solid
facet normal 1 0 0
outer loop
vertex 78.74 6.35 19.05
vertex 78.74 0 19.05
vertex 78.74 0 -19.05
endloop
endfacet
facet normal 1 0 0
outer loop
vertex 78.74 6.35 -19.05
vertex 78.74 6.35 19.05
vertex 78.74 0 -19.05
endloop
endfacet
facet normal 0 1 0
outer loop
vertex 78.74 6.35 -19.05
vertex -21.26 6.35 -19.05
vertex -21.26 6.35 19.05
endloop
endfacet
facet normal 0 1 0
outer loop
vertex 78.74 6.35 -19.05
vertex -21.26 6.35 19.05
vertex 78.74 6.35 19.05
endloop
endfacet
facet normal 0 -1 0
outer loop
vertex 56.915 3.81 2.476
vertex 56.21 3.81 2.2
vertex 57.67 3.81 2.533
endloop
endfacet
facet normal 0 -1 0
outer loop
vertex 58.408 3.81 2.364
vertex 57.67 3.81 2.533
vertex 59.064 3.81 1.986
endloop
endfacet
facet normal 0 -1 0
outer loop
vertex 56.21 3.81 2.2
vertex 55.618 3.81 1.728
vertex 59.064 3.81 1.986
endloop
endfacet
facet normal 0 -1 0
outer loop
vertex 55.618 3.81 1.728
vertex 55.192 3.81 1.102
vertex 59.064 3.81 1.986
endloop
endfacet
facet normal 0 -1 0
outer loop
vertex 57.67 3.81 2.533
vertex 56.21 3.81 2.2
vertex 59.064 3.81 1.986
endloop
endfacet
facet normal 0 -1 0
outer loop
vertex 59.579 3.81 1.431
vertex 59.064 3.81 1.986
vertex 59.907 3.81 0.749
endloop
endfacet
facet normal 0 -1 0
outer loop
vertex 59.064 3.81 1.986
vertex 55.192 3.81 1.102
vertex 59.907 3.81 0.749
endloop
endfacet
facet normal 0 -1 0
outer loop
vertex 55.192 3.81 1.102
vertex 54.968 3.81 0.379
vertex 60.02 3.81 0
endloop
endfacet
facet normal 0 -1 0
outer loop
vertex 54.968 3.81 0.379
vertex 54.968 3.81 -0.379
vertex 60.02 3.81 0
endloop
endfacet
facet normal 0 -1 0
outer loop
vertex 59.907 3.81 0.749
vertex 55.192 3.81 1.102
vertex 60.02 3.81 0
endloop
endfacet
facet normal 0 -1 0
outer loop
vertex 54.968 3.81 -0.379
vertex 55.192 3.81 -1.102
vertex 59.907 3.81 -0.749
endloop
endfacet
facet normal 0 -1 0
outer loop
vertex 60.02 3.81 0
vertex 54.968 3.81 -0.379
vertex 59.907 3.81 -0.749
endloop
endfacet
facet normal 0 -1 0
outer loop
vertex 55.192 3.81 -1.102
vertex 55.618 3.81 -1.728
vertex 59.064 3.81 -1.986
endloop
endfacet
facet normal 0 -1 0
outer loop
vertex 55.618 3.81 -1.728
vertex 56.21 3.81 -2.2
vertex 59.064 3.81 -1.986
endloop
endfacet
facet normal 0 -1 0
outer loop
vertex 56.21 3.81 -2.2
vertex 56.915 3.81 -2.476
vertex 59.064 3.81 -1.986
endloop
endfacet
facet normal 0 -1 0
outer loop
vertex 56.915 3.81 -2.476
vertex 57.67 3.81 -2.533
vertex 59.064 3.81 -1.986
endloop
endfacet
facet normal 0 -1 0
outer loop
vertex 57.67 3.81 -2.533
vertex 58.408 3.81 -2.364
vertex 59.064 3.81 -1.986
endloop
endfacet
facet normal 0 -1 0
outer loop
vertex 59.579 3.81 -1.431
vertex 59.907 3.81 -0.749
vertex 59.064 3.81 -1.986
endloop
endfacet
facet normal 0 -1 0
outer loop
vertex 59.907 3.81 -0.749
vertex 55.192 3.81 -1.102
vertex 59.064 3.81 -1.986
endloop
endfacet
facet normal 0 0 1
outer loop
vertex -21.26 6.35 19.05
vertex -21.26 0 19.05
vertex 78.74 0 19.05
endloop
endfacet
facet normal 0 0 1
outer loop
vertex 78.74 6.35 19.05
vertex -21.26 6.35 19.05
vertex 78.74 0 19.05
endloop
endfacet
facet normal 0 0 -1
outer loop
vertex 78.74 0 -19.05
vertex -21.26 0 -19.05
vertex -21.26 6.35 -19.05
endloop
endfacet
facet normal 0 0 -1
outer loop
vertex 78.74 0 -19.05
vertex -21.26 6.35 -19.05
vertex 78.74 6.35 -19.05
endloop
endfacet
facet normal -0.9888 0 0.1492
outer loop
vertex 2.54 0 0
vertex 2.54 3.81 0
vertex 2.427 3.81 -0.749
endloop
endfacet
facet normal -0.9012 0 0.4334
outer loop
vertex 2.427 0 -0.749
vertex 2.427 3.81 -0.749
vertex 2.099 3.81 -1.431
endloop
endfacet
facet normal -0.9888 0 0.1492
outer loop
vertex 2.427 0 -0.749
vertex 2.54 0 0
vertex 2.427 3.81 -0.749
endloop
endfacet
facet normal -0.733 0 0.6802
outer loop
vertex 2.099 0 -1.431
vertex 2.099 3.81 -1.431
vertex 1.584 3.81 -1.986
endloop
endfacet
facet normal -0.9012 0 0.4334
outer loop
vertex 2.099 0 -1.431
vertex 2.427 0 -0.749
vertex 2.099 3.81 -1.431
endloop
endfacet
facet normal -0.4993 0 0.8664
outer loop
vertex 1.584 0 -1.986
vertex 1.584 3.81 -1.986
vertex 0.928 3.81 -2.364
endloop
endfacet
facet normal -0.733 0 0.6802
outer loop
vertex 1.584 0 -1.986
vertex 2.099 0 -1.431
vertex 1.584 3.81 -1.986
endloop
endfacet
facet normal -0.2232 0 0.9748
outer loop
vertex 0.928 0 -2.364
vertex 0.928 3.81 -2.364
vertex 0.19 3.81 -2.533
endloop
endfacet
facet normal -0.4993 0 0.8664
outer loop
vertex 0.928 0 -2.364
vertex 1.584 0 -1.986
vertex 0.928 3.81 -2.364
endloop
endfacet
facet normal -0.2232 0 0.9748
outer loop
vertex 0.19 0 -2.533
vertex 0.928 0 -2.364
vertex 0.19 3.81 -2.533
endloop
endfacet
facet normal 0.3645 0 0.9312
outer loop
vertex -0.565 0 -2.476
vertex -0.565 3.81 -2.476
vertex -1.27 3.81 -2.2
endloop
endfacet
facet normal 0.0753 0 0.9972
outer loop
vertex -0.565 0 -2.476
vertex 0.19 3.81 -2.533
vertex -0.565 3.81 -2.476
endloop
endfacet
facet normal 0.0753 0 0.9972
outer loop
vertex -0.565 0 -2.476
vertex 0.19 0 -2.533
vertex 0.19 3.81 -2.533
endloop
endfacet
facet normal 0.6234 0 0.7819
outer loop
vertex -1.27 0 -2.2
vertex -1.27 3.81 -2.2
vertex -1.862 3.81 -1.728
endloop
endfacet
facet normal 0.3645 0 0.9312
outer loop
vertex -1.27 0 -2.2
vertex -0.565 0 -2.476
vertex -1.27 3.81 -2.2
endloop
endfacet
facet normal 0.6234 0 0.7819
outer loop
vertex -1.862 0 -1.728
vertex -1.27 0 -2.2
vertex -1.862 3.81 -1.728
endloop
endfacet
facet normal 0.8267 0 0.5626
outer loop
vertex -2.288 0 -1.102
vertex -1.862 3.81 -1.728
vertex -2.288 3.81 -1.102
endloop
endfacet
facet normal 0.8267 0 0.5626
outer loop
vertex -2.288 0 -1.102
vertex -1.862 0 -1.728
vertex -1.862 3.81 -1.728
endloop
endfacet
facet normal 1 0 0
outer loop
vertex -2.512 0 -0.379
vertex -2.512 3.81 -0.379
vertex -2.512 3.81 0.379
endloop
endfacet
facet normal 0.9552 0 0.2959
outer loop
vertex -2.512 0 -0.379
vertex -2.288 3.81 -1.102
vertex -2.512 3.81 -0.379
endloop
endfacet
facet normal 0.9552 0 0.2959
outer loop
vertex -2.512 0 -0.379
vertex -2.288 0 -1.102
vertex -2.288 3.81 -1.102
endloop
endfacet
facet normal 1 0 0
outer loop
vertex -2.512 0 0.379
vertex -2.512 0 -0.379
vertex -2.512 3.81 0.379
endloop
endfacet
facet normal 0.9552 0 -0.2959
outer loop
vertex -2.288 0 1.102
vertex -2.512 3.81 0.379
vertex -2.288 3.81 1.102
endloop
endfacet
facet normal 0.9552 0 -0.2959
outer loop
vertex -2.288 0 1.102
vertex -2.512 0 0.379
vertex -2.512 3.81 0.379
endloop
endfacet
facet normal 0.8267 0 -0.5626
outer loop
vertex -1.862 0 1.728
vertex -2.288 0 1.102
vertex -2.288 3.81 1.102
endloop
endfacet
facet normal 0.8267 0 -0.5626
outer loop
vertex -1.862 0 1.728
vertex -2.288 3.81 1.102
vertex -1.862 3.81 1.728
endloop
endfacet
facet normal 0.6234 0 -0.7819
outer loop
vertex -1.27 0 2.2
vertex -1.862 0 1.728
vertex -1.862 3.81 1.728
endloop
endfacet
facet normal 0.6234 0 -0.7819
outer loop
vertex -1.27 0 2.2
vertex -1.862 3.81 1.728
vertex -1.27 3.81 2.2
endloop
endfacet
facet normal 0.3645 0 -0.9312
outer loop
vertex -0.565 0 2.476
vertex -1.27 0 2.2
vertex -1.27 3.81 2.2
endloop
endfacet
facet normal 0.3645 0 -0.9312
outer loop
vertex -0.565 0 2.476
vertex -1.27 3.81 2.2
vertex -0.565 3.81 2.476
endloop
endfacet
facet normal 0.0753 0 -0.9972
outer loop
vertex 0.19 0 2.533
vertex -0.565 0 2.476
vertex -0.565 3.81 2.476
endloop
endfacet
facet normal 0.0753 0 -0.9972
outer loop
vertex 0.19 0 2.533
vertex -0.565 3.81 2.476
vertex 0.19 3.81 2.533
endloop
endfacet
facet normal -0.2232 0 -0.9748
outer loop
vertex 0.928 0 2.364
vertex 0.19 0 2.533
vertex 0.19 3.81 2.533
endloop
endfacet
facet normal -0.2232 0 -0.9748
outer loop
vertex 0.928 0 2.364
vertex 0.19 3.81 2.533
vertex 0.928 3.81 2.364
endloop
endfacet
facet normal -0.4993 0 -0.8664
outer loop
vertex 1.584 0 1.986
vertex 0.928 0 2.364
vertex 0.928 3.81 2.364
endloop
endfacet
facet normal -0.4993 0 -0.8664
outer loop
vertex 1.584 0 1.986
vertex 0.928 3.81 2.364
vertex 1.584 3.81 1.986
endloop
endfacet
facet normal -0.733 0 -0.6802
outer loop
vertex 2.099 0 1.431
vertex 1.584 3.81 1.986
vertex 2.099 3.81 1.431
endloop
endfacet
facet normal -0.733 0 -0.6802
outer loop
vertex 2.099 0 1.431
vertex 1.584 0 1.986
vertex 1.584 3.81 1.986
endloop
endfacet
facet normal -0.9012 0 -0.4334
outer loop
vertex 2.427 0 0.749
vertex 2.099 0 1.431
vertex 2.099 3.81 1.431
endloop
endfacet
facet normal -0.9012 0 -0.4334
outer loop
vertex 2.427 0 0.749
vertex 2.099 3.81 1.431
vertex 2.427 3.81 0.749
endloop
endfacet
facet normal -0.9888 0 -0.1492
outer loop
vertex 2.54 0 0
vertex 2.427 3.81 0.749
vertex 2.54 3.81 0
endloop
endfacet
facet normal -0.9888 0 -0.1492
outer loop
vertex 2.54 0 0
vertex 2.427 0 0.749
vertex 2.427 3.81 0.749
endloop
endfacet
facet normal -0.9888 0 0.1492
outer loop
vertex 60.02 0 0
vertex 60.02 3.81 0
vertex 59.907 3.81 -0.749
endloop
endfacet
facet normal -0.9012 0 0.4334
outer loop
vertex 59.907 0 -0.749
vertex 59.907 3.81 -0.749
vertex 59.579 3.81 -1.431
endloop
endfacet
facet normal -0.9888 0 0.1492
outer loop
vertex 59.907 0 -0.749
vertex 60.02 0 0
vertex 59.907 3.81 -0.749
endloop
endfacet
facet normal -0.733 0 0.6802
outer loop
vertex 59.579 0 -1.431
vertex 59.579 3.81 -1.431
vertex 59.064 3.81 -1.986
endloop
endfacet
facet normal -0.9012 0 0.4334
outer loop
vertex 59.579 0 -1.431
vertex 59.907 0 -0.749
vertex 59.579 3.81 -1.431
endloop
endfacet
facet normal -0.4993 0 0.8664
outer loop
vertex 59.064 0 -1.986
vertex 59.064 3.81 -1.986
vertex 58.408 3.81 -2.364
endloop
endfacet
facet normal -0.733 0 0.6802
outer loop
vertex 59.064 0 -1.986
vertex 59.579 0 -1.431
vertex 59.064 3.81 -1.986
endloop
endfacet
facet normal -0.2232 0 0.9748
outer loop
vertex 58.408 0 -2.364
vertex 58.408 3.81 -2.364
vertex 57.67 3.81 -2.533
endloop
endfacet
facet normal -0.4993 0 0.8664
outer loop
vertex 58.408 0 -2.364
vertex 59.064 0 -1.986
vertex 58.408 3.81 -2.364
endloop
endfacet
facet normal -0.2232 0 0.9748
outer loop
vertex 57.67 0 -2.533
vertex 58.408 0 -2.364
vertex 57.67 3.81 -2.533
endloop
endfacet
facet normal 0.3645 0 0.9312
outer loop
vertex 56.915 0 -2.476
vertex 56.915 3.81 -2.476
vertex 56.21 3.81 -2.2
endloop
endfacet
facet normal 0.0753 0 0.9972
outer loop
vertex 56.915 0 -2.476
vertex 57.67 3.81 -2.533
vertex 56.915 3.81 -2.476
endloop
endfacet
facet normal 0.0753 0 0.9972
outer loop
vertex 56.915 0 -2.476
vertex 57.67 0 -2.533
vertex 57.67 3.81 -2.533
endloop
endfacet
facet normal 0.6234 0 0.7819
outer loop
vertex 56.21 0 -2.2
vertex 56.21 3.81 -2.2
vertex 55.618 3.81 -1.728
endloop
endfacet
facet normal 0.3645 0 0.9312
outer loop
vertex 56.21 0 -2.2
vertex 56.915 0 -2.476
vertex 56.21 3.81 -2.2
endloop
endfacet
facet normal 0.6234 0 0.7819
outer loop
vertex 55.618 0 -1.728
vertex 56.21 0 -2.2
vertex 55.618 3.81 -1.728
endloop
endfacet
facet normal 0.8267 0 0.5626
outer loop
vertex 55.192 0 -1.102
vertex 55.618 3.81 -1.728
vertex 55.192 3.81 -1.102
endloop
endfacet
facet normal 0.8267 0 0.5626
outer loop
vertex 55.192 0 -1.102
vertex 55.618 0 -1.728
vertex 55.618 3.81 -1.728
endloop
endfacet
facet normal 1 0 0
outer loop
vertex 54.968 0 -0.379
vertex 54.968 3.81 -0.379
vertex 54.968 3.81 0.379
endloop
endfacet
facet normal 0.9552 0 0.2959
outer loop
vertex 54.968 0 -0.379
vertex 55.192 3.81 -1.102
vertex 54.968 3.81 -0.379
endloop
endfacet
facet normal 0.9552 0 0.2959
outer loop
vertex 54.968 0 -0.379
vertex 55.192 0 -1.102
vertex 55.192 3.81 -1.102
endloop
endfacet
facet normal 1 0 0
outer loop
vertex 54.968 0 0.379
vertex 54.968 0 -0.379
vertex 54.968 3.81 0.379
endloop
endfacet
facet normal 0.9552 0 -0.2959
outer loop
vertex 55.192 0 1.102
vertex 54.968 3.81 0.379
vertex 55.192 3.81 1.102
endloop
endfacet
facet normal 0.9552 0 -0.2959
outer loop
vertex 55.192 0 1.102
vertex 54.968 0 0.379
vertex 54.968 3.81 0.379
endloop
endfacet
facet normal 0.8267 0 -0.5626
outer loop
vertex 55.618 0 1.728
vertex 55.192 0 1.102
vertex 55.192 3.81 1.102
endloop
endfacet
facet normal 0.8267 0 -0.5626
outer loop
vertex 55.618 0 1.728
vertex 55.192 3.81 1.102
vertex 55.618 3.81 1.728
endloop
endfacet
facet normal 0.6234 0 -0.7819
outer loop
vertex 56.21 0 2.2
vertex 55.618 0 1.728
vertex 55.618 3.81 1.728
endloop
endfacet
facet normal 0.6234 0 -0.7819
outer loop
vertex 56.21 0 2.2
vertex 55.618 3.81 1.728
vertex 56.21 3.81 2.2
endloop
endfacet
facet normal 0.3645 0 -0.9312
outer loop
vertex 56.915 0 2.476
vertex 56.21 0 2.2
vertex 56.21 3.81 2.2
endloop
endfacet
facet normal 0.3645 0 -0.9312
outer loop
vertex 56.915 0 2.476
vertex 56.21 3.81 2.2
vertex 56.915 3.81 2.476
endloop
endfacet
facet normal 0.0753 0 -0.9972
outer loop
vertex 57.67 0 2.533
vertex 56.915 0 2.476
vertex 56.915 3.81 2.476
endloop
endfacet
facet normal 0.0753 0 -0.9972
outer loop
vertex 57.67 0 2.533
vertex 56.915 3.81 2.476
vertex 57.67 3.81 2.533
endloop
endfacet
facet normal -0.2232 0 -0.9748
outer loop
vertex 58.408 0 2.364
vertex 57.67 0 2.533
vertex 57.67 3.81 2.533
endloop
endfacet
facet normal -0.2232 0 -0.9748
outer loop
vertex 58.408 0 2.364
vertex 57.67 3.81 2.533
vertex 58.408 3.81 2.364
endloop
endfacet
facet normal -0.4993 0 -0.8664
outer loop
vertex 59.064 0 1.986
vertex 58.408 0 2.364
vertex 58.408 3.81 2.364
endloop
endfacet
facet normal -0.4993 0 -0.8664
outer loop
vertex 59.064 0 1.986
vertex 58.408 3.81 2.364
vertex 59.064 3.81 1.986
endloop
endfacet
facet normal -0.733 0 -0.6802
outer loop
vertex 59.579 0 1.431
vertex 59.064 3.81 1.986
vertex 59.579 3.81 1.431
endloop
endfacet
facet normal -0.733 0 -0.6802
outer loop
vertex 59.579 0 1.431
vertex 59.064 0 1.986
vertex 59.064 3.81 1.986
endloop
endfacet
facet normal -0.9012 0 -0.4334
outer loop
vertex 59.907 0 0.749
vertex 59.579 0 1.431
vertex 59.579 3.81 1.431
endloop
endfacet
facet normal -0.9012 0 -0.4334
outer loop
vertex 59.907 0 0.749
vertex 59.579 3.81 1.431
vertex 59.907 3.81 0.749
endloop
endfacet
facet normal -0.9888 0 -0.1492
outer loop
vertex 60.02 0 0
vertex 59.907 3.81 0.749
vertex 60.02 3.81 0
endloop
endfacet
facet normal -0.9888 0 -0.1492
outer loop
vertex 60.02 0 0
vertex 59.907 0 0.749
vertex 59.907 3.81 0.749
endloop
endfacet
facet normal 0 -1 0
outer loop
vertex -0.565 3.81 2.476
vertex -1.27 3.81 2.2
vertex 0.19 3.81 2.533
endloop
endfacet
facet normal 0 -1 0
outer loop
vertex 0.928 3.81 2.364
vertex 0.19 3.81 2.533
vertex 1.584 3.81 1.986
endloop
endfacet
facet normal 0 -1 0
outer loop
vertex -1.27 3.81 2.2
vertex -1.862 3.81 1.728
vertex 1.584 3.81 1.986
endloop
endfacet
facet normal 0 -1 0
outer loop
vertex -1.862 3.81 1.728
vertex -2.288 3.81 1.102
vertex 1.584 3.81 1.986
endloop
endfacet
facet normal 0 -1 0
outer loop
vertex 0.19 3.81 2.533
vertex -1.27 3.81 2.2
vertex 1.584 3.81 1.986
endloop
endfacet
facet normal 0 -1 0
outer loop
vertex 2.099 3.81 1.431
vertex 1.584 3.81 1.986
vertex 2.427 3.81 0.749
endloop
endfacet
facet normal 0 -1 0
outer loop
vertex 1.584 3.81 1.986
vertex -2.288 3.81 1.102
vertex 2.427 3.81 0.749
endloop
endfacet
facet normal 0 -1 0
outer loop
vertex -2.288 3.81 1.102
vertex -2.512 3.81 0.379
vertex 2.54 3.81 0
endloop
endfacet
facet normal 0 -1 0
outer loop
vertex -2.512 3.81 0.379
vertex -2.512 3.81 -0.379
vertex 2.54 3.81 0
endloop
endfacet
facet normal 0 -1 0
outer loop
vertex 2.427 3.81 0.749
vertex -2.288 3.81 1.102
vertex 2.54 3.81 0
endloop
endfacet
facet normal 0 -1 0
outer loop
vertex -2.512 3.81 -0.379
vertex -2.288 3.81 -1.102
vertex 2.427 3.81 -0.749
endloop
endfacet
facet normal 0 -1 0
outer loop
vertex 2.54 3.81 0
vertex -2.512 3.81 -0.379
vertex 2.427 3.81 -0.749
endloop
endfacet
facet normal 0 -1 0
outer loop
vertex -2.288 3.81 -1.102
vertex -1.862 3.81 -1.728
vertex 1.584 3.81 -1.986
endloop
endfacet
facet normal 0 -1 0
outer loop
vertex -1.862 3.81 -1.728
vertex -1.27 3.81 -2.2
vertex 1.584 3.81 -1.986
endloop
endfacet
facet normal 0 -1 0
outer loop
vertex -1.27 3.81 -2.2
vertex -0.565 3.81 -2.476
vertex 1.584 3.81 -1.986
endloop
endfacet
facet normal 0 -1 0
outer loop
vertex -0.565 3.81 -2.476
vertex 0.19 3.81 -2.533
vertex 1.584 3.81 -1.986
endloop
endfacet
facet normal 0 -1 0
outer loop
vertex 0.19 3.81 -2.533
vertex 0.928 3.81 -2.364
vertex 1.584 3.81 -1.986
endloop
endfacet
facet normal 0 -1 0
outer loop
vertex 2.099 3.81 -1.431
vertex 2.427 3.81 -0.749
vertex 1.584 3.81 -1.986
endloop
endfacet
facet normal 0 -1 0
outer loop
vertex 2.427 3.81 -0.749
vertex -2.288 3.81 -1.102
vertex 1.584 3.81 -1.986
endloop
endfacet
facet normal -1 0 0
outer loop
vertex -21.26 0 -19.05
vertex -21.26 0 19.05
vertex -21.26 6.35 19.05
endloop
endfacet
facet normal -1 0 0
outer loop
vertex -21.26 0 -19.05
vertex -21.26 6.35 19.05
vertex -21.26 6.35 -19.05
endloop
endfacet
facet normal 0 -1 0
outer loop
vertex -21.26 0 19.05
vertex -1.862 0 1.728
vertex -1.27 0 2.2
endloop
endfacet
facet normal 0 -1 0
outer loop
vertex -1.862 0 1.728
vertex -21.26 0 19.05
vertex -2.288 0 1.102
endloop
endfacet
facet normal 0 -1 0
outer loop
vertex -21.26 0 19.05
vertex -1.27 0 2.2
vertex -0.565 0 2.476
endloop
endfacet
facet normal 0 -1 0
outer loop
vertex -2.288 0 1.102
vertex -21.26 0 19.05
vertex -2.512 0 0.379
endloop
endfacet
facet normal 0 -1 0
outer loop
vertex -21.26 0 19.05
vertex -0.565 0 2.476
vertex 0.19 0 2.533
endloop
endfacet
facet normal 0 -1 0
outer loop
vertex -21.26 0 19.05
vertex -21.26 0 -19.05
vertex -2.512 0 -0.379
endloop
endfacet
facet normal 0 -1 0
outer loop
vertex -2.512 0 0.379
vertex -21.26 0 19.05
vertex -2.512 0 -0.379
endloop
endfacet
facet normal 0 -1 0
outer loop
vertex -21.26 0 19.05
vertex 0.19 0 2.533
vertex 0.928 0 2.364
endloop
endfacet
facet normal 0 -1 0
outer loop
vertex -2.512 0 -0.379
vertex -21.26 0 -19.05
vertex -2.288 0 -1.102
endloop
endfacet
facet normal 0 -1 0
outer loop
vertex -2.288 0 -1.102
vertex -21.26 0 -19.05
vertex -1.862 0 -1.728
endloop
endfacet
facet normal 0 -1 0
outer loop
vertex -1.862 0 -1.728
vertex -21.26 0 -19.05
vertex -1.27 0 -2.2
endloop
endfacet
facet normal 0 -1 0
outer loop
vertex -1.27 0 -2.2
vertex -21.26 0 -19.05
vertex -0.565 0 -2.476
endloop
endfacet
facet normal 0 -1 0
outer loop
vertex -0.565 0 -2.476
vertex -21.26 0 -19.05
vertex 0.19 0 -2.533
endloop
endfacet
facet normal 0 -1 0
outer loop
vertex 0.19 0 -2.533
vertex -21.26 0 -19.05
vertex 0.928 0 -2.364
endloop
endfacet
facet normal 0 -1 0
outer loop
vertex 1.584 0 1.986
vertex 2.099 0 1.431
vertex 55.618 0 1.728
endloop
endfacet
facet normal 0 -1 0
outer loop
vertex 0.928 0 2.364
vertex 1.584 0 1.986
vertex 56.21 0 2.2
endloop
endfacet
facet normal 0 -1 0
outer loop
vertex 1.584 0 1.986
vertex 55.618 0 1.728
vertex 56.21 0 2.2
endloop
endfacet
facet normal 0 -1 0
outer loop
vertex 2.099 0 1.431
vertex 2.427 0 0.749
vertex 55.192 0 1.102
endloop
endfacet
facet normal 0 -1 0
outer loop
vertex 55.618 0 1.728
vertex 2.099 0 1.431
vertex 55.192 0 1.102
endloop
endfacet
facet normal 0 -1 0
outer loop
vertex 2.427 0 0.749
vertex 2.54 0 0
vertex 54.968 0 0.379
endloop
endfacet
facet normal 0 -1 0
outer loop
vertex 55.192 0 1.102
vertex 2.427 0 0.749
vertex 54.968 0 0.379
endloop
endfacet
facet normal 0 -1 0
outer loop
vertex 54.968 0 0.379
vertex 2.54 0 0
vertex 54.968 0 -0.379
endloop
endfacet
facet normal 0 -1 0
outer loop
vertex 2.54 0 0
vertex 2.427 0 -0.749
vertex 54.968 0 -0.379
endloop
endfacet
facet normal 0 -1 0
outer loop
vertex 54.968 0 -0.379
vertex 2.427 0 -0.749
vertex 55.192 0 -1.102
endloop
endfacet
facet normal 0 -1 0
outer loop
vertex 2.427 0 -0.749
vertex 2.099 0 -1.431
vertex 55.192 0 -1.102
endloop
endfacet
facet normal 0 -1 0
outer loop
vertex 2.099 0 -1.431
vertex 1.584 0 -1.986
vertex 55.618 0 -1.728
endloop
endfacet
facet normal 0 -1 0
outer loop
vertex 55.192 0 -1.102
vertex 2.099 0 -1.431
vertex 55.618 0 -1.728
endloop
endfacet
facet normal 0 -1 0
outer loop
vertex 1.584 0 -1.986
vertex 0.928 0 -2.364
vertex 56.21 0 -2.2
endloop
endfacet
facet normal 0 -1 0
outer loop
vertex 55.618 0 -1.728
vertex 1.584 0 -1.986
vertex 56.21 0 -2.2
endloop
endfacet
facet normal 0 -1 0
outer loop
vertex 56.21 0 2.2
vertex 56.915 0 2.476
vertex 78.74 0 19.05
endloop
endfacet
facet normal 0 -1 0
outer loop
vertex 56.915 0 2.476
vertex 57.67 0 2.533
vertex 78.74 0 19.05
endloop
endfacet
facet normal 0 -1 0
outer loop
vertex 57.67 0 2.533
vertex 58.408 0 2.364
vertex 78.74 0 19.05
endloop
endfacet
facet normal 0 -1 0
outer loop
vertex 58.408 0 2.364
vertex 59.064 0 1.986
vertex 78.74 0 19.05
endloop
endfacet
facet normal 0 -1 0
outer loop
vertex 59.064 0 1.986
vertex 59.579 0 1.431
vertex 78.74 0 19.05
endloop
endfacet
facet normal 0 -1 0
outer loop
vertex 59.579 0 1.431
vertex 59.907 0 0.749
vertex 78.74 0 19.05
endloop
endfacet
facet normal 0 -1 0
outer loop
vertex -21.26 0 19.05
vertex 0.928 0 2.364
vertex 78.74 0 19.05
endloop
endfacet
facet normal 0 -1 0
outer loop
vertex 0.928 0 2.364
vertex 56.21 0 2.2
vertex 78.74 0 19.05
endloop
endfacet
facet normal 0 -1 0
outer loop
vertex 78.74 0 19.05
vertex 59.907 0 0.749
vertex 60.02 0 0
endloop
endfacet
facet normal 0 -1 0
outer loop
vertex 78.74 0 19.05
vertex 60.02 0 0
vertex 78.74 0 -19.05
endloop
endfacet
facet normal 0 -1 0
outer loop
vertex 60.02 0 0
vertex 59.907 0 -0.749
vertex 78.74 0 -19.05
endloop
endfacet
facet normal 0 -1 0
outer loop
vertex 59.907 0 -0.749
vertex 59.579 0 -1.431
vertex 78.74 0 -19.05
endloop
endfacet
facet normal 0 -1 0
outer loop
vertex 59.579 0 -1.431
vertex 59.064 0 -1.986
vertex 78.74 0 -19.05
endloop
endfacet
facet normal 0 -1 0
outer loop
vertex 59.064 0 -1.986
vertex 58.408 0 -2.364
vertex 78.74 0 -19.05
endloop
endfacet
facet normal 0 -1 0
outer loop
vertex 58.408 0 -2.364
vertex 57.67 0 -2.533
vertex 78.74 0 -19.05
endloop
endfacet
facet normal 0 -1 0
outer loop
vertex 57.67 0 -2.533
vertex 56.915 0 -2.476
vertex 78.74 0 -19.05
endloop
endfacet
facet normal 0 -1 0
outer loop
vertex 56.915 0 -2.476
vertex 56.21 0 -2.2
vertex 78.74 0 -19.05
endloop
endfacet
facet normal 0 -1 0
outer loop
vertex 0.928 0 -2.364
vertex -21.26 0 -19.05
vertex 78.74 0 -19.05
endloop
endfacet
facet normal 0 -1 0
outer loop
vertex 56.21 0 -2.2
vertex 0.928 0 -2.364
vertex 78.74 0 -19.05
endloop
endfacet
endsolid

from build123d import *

# Parameters (mm, degrees)
SKETCH1_W           = 100
SKETCH1_H           = 38.1
SKETCH1_R           = 2.54
BOSS_EXTRUDE1_DEPTH = 6.35
SKETCH2_W           = 100
SKETCH2_H           = 38.1
BOSS_EXTRUDE2_DEPTH = 2.54


with BuildPart() as part:
    # Sketch1 → Boss-Extrude1 (new body)
    with BuildSketch(Plane(origin=(0, 0, 0), x_dir=(1, 0, 0), z_dir=(0, 1, 0))):
        with Locations((28.74, 0)):
            Rectangle(SKETCH1_W, SKETCH1_H)
        Circle(SKETCH1_R, mode=Mode.SUBTRACT)
        with Locations((57.48, 0)):
            Circle(SKETCH1_R, mode=Mode.SUBTRACT)
    extrude(amount=BOSS_EXTRUDE1_DEPTH)

    # Sketch2 → Boss-Extrude2 (add)
    with BuildSketch(Plane(origin=(0, 6.35, 0), x_dir=(1, 0, 0), z_dir=(0, 1, 0))):
        with Locations((28.74, 0)):
            Rectangle(SKETCH2_W, SKETCH2_H)
    extrude(amount=-BOSS_EXTRUDE2_DEPTH)


solid = part.part
